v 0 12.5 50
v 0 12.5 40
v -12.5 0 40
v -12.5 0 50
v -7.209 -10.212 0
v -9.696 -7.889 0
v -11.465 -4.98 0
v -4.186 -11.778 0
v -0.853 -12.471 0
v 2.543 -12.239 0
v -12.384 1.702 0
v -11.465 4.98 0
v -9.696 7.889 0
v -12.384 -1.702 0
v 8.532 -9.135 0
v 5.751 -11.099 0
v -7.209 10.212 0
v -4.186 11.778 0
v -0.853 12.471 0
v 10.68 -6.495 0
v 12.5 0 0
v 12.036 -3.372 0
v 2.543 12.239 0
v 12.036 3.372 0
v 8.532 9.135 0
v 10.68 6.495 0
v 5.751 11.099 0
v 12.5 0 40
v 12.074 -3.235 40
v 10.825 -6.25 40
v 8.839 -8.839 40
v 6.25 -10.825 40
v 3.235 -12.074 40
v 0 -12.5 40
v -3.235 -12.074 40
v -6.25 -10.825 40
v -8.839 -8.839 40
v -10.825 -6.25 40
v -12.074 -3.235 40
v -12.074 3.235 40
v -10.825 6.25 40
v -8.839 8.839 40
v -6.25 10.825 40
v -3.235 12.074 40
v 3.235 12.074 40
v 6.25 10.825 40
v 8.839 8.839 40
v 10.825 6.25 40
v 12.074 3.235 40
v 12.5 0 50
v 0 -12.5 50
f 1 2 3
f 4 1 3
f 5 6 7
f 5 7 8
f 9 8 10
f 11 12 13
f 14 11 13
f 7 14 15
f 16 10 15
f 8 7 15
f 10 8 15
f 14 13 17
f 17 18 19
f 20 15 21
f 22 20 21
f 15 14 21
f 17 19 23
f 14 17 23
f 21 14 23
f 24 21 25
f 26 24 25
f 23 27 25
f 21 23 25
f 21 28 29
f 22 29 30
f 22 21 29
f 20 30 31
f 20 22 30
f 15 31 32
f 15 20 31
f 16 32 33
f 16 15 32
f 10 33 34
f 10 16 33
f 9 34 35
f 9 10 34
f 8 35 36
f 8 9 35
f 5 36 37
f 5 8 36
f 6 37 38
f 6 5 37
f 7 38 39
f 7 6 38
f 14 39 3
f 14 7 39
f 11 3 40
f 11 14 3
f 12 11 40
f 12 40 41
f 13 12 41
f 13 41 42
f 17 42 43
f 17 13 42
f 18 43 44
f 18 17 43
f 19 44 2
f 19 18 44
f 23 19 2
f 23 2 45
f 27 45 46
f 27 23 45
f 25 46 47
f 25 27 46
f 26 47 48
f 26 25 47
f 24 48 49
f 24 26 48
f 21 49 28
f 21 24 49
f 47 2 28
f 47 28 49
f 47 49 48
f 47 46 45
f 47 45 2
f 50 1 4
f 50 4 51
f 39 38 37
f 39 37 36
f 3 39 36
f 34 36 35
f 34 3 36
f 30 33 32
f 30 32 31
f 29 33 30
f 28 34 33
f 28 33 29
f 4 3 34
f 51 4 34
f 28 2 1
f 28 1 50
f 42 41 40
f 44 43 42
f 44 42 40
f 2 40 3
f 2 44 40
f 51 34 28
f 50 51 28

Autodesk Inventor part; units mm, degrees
ref_plane "YZ Plane" through (0, 0, 0) normal (1, 0, 0) x (0, 1, 0)
ref_plane "XZ Plane" through (0, 0, 0) normal (0, 1, 0) x (-1, 0, 0)
ref_plane "XY Plane" through (0, 0, 0) normal (0, 0, 1) x (1, 0, 0)
sketch "Boceto1" plane through (0, 0, 0) normal (0, 0, 1) x (1, 0, 0)
  circle A0 centre (0, 0) radius 12.5
  dimension "d0" = 25
extrude "Extrusión1" add sketch "Boceto1" along normal blind 40
sketch "Boceto2" plane through (0, 0, 40) normal (0, 0, 1) x (1, 0, 0)
  circle A0 centre (0, 0) radius 12.5 projected
  line L0 (0, 12.5) -> (12.5, 0)
  line L1 (0, -12.5) -> (12.5, 0)
  line L2 (0, 12.5) -> (-12.5, 0)
  line L3 (-12.5, 0) -> (0, -12.5)
extrude "Extrusión2" add sketch "Boceto2" along normal blind 10 contours L1 L3 L2 L0
properties part number "ejeM"
